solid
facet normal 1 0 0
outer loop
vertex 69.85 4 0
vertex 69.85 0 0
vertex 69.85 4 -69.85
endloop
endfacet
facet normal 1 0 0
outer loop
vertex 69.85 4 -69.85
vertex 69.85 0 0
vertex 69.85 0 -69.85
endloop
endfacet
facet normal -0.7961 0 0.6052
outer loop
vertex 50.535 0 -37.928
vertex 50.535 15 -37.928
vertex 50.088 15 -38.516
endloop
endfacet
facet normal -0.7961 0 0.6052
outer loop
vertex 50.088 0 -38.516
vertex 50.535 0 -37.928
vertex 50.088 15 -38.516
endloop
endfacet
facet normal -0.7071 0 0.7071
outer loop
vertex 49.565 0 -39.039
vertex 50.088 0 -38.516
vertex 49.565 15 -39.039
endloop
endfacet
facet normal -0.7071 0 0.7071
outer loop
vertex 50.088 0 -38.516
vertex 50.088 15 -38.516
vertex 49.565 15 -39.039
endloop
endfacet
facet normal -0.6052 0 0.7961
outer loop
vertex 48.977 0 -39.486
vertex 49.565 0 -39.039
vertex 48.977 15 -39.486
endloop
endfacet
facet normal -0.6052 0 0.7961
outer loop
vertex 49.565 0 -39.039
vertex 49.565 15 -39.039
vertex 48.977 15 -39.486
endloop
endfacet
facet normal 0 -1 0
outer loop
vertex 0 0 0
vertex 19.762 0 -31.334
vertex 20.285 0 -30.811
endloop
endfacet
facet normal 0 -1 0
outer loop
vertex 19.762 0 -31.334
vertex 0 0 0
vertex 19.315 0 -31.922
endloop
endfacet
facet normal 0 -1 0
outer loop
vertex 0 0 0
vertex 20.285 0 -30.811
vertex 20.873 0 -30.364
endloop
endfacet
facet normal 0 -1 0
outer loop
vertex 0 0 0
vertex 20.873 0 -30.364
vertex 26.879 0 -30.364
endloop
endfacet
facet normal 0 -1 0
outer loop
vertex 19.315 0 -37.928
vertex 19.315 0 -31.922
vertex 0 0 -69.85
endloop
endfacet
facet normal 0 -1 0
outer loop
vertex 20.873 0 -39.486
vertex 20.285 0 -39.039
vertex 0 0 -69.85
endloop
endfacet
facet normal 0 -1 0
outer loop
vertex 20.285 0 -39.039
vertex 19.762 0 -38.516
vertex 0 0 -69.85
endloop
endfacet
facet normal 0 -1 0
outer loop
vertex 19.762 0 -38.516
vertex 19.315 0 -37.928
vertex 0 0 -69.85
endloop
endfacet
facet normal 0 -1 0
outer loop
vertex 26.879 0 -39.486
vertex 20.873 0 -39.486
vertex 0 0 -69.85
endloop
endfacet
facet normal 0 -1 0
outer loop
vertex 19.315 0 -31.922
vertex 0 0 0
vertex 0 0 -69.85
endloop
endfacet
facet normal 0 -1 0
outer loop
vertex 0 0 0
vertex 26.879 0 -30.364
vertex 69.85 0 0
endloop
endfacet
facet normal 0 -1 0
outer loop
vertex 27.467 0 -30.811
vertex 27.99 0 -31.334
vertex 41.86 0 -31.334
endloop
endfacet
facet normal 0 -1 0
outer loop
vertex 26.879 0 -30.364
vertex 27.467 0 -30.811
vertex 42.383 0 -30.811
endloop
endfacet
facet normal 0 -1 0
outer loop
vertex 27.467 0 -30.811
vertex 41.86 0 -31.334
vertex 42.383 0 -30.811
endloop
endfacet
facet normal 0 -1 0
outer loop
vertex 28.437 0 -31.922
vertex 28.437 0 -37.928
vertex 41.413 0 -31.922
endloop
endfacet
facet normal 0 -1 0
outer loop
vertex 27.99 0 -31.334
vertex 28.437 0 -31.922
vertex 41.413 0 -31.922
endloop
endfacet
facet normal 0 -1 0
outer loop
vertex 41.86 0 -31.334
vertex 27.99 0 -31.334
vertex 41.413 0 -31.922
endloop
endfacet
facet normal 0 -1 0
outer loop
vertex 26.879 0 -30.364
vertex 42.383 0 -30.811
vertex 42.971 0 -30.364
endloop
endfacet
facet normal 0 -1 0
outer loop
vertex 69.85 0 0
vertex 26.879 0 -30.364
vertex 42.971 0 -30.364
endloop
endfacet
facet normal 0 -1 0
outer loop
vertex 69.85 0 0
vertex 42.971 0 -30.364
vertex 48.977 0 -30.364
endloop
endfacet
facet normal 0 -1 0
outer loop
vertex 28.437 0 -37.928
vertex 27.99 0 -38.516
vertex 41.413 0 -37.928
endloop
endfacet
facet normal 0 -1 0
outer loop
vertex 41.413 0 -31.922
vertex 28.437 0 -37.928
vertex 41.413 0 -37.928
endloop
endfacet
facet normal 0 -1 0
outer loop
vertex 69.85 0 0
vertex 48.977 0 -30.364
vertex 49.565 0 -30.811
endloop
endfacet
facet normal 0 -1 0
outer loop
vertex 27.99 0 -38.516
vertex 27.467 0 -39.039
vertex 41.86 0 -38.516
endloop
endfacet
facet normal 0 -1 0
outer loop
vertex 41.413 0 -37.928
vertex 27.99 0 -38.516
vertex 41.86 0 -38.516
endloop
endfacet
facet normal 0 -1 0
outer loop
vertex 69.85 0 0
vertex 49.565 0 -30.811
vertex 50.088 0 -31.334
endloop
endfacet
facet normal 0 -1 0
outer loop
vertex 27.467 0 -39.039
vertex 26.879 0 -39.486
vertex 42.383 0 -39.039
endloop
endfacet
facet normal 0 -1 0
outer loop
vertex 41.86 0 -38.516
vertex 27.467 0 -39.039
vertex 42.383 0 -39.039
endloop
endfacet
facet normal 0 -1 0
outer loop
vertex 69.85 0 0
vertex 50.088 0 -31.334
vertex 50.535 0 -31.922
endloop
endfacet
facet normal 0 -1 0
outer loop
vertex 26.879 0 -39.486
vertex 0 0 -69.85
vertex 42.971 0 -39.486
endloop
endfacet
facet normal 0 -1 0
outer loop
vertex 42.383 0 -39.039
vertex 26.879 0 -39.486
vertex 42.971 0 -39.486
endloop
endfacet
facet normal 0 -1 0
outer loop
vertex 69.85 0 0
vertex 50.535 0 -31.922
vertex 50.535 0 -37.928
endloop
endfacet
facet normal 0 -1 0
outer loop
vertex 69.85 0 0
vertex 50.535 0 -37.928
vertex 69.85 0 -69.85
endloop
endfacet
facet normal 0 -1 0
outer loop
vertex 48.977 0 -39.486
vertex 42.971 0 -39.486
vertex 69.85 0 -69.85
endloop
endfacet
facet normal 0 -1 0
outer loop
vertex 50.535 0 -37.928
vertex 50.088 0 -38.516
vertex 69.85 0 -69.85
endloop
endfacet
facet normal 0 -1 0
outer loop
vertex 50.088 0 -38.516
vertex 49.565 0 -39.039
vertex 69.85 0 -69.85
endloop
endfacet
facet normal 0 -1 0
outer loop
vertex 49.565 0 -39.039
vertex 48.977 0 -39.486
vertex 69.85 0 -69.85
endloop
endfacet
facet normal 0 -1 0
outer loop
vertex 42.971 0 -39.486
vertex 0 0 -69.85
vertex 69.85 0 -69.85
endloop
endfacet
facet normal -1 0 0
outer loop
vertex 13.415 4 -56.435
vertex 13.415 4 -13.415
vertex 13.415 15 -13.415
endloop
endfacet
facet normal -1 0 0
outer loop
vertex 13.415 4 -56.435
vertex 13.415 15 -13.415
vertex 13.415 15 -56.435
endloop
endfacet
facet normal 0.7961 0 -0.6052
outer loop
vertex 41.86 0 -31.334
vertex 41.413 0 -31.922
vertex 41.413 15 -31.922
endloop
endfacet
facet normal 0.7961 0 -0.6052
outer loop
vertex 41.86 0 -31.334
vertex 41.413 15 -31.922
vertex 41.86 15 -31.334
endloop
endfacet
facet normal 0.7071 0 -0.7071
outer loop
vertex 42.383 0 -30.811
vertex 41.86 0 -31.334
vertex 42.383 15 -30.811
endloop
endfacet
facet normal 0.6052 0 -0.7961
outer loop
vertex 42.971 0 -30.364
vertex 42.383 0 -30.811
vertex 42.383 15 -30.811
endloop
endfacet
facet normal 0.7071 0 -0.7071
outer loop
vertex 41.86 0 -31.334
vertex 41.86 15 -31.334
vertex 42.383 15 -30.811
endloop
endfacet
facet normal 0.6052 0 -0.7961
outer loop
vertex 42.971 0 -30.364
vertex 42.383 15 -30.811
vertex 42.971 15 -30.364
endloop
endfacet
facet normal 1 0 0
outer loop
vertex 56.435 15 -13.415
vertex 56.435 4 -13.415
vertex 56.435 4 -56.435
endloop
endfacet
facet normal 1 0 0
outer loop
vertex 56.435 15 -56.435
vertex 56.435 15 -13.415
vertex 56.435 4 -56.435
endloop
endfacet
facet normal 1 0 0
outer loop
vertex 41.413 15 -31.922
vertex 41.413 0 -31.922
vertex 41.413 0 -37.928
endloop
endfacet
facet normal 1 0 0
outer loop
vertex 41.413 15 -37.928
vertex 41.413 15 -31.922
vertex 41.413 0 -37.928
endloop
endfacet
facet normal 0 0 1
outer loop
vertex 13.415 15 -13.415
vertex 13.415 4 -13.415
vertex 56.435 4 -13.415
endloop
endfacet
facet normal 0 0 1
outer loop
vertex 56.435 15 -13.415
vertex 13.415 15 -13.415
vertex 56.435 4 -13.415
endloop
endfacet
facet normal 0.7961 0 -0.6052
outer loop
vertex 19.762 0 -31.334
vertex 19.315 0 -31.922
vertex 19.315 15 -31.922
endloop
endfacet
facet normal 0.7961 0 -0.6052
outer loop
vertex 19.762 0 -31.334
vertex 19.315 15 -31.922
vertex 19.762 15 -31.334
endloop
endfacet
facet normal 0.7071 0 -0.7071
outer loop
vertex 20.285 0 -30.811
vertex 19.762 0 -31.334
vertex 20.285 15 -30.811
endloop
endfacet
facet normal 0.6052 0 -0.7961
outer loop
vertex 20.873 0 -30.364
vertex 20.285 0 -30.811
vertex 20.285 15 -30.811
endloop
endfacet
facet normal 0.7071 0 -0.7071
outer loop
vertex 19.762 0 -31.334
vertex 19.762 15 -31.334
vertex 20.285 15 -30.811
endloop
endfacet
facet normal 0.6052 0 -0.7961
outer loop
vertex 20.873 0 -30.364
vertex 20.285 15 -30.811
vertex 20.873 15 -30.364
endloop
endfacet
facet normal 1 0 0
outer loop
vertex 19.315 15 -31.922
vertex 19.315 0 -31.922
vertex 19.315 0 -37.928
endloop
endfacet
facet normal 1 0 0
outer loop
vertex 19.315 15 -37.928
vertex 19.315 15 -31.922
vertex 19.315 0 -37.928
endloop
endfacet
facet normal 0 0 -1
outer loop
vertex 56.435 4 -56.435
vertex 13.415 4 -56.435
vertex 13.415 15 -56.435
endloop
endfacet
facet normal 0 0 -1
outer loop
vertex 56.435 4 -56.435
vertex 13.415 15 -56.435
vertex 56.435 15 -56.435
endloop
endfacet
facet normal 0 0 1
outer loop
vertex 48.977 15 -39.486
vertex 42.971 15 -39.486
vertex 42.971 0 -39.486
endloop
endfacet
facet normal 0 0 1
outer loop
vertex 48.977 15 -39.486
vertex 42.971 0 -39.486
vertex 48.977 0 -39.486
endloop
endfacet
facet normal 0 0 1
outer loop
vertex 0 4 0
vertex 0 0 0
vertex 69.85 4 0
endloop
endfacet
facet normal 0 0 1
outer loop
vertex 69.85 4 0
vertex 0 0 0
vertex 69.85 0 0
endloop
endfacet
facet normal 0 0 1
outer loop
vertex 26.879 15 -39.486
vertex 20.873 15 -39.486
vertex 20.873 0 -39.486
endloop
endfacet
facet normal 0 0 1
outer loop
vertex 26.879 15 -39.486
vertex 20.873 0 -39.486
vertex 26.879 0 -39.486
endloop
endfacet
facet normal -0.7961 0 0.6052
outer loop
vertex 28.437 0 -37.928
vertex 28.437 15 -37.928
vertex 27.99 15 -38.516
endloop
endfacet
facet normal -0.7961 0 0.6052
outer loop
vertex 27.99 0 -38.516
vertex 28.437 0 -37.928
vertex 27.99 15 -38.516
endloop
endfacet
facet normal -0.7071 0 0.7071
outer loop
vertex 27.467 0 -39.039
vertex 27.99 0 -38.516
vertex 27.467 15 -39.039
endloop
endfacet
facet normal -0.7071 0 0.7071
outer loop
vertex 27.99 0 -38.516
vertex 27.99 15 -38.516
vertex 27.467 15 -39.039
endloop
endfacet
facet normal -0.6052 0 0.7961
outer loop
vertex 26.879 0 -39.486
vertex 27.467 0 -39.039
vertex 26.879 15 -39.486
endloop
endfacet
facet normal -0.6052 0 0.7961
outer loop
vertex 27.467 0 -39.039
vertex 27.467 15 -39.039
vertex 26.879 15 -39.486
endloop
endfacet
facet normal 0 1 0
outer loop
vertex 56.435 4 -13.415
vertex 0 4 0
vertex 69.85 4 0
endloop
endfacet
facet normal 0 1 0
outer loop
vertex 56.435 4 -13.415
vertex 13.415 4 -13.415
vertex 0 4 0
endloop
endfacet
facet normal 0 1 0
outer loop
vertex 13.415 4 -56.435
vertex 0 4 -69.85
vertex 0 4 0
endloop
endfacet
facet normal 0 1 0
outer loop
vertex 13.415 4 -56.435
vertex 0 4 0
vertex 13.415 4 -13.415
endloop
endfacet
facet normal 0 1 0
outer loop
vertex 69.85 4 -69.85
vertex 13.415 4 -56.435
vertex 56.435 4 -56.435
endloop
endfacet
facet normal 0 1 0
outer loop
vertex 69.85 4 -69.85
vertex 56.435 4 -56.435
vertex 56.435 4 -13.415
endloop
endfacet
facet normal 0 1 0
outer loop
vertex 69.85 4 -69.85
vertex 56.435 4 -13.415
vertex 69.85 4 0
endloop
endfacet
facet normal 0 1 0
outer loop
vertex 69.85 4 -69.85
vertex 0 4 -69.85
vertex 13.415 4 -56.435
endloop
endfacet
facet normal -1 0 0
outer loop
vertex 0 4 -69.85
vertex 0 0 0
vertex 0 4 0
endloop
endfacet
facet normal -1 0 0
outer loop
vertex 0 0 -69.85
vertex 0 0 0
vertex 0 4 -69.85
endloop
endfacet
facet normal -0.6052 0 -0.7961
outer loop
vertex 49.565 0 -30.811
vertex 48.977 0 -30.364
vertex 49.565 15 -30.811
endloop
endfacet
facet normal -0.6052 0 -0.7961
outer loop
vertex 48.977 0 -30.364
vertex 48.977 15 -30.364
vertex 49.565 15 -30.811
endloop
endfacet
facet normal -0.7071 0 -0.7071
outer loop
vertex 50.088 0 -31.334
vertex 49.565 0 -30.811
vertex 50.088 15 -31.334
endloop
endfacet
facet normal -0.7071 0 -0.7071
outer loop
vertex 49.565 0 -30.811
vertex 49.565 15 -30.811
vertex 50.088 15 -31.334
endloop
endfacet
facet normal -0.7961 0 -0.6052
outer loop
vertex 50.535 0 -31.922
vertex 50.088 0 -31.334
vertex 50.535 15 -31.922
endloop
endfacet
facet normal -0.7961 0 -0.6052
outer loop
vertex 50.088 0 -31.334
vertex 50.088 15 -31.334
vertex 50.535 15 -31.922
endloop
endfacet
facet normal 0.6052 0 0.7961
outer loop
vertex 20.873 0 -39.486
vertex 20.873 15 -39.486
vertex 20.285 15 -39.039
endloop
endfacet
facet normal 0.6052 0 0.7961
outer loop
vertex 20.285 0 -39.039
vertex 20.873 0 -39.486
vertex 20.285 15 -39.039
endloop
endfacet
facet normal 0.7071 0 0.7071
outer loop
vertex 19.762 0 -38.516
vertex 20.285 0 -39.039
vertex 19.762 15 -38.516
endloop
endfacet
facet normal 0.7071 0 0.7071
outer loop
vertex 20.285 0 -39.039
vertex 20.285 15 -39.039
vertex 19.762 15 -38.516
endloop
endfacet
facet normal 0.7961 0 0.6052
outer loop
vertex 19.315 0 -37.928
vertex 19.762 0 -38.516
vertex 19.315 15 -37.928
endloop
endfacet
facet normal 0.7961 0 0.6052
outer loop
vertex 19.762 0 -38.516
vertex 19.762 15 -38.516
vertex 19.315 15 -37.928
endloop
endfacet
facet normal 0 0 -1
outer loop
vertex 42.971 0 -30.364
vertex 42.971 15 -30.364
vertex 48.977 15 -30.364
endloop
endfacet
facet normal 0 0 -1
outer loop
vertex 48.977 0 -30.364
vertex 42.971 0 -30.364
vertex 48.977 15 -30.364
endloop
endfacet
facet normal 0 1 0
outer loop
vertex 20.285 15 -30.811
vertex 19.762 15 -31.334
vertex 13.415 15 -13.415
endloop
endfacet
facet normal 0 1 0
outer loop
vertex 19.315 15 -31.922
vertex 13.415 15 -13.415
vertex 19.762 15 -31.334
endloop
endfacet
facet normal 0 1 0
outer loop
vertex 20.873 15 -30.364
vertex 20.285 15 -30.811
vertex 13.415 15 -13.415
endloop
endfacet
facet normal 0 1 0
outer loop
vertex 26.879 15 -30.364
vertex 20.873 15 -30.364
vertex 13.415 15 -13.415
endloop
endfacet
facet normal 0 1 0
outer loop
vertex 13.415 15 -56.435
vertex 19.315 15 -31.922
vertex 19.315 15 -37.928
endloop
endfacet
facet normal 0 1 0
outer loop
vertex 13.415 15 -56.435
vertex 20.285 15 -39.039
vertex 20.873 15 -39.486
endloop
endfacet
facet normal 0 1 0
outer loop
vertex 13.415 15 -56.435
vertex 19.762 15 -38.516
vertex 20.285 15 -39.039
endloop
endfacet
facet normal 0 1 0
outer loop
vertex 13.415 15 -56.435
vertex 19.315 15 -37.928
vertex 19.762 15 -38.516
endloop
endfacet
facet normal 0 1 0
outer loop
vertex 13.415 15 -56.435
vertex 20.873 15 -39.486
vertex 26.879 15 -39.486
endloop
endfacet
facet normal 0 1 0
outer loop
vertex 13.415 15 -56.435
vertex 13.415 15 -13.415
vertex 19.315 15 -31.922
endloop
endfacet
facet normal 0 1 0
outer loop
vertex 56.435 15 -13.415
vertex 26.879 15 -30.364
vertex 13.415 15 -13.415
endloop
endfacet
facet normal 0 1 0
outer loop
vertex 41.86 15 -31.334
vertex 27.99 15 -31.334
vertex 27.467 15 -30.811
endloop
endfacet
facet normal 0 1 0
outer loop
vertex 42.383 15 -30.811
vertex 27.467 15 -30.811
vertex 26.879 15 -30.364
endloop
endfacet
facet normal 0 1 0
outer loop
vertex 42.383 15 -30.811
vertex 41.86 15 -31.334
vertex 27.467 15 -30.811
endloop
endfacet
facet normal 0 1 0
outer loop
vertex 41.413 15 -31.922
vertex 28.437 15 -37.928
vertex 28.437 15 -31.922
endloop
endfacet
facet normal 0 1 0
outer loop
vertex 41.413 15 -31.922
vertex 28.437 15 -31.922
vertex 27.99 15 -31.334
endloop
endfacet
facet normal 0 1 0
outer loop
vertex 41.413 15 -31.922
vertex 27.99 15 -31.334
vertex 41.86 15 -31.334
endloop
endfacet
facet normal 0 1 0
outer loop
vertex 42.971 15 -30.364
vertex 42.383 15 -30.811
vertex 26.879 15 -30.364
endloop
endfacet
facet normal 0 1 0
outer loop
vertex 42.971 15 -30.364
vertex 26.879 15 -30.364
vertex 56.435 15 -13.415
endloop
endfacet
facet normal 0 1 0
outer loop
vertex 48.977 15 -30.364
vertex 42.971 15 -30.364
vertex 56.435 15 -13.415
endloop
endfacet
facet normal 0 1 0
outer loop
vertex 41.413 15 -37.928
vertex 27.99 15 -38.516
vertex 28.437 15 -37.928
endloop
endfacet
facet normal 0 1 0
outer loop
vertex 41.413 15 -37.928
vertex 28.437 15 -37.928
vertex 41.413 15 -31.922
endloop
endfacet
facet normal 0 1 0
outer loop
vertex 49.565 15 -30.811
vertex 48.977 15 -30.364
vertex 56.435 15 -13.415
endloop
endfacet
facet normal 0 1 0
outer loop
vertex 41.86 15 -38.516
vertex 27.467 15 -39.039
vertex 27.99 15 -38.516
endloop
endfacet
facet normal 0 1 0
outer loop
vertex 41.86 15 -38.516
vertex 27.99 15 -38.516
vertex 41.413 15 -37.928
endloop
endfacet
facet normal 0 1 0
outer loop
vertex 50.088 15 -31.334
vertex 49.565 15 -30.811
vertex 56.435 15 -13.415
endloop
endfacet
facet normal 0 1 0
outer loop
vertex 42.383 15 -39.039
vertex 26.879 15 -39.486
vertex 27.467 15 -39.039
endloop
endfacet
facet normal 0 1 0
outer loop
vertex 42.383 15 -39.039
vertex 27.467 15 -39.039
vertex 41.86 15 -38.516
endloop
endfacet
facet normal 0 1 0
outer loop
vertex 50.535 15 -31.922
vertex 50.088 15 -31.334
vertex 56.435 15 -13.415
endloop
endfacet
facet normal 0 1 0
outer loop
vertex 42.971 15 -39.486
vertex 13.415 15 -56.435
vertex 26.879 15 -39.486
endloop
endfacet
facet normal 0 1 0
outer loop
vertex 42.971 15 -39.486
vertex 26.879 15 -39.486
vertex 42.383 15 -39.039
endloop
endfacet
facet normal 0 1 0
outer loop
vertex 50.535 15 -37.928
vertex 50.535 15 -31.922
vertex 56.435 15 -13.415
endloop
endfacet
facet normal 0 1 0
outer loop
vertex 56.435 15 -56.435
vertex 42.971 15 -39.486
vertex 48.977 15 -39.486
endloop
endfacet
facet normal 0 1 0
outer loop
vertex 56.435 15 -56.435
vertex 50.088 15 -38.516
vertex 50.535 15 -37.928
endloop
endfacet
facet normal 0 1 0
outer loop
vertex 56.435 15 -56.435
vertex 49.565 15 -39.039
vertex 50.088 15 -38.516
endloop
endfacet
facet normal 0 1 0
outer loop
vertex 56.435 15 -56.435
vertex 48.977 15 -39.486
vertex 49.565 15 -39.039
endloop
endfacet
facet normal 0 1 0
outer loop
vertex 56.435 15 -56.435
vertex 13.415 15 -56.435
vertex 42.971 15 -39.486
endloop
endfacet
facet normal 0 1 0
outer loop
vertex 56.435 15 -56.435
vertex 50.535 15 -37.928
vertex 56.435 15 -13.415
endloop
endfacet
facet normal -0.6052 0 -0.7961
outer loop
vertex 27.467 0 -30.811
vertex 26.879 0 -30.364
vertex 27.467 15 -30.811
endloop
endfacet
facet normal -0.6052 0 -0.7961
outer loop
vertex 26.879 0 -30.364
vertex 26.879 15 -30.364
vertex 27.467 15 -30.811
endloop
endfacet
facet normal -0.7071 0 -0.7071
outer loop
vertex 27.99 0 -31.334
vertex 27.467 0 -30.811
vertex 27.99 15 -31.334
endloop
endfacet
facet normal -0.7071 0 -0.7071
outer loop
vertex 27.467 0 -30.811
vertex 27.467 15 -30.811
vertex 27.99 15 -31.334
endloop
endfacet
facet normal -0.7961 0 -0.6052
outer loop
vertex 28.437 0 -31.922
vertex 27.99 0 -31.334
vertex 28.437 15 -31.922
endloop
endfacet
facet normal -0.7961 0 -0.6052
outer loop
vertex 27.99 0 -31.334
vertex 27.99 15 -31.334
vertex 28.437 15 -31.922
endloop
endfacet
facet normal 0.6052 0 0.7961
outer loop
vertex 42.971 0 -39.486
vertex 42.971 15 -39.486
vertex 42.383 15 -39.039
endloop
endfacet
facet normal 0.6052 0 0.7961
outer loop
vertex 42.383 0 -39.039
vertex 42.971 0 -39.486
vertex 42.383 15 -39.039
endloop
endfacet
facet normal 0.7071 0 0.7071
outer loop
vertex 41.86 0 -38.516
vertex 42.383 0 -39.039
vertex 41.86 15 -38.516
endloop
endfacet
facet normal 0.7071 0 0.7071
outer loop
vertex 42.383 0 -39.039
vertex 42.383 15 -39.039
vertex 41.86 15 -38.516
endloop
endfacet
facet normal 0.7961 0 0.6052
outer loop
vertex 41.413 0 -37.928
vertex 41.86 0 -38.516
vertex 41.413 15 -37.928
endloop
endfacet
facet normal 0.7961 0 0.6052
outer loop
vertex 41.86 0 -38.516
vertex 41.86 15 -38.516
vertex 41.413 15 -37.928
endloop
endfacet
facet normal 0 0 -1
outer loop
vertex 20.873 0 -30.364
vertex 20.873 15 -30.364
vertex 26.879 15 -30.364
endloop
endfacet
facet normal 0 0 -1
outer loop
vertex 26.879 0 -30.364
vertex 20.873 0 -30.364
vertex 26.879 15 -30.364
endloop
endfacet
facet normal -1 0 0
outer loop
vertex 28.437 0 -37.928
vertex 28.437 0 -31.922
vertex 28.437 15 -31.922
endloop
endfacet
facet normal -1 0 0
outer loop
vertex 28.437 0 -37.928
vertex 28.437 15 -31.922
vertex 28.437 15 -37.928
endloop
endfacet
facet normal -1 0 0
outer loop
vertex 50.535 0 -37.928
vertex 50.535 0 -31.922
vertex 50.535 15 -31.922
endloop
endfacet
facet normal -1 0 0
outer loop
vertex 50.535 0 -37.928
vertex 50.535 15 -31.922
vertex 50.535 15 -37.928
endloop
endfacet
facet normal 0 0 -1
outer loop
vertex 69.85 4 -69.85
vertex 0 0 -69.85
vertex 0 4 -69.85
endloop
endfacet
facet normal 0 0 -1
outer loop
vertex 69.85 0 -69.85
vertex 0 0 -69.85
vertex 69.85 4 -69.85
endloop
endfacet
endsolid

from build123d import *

# Parameters (mm, degrees)
SKETCH1_W               = 69.85
SKETCH1_H               = 69.85
BOSS_EXTRUDE1_DEPTH     = 4
SKETCH2_W               = 43.02
SKETCH2_H               = 43.02
SKETCH2_R               = 5.461
BOSS_EXTRUDE2_DEPTH     = 11
SKETCH3_R               = 5.461
CUT_EXTRUDE1_DEPTH      = 1
CUT_EXTRUDE1_DEPTH_BACK = 16
SKETCH4_W               = 43.02
SKETCH4_H               = 43.02
SKETCH4_W_2             = 9.122
SKETCH4_H_2             = 9.122
BOSS_EXTRUDE3_DEPTH     = 15


with BuildPart() as part:
    # Sketch1 → Boss-Extrude1 (new body)
    with BuildSketch(Plane(origin=(0, 0, 0), x_dir=(1, 0, 0), z_dir=(0, 1, 0))):
        with Locations((34.925, 34.925)):
            Rectangle(SKETCH1_W, SKETCH1_H)
    extrude(amount=BOSS_EXTRUDE1_DEPTH)

    # Sketch2 → Boss-Extrude2 (add)
    with BuildSketch(Plane(origin=(0, 4, 0), x_dir=(1, 0, 0), z_dir=(0, 1, 0))):
        with Locations((34.925, 34.925)):
            Rectangle(SKETCH2_W, SKETCH2_H)
        with Locations((23.876, 34.925)):
            Circle(SKETCH2_R, mode=Mode.SUBTRACT)
        with Locations((45.974, 34.925)):
            Circle(SKETCH2_R, mode=Mode.SUBTRACT)
    extrude(amount=BOSS_EXTRUDE2_DEPTH)

    # Sketch3 → Cut-Extrude1 (cut, two sides)
    with BuildSketch(Plane(origin=(0, 15, 0), x_dir=(1, 0, 0), z_dir=(0, 1, 0))) as cut_extrude1_sk:
        with Locations((23.876, 34.925)):
            Circle(SKETCH3_R)
        with Locations((45.974, 34.925)):
            Circle(SKETCH3_R)
    extrude(amount=CUT_EXTRUDE1_DEPTH, mode=Mode.SUBTRACT)
    extrude(cut_extrude1_sk.sketch, amount=-CUT_EXTRUDE1_DEPTH_BACK, mode=Mode.SUBTRACT)

    # Sketch4 → Boss-Extrude3 (add)
    with BuildSketch(Plane(origin=(0, 15, 0), x_dir=(1, 0, 0), z_dir=(0, 1, 0))):
        with Locations((34.925, 34.925)):
            Rectangle(SKETCH4_W, SKETCH4_H)
        with Locations((23.876, 34.925)):
            Rectangle(SKETCH4_W_2, SKETCH4_H_2, mode=Mode.SUBTRACT)
        with Locations((45.974, 34.925)):
            Rectangle(SKETCH4_W_2, SKETCH4_H_2, mode=Mode.SUBTRACT)
    extrude(amount=-BOSS_EXTRUDE3_DEPTH)


solid = part.part
